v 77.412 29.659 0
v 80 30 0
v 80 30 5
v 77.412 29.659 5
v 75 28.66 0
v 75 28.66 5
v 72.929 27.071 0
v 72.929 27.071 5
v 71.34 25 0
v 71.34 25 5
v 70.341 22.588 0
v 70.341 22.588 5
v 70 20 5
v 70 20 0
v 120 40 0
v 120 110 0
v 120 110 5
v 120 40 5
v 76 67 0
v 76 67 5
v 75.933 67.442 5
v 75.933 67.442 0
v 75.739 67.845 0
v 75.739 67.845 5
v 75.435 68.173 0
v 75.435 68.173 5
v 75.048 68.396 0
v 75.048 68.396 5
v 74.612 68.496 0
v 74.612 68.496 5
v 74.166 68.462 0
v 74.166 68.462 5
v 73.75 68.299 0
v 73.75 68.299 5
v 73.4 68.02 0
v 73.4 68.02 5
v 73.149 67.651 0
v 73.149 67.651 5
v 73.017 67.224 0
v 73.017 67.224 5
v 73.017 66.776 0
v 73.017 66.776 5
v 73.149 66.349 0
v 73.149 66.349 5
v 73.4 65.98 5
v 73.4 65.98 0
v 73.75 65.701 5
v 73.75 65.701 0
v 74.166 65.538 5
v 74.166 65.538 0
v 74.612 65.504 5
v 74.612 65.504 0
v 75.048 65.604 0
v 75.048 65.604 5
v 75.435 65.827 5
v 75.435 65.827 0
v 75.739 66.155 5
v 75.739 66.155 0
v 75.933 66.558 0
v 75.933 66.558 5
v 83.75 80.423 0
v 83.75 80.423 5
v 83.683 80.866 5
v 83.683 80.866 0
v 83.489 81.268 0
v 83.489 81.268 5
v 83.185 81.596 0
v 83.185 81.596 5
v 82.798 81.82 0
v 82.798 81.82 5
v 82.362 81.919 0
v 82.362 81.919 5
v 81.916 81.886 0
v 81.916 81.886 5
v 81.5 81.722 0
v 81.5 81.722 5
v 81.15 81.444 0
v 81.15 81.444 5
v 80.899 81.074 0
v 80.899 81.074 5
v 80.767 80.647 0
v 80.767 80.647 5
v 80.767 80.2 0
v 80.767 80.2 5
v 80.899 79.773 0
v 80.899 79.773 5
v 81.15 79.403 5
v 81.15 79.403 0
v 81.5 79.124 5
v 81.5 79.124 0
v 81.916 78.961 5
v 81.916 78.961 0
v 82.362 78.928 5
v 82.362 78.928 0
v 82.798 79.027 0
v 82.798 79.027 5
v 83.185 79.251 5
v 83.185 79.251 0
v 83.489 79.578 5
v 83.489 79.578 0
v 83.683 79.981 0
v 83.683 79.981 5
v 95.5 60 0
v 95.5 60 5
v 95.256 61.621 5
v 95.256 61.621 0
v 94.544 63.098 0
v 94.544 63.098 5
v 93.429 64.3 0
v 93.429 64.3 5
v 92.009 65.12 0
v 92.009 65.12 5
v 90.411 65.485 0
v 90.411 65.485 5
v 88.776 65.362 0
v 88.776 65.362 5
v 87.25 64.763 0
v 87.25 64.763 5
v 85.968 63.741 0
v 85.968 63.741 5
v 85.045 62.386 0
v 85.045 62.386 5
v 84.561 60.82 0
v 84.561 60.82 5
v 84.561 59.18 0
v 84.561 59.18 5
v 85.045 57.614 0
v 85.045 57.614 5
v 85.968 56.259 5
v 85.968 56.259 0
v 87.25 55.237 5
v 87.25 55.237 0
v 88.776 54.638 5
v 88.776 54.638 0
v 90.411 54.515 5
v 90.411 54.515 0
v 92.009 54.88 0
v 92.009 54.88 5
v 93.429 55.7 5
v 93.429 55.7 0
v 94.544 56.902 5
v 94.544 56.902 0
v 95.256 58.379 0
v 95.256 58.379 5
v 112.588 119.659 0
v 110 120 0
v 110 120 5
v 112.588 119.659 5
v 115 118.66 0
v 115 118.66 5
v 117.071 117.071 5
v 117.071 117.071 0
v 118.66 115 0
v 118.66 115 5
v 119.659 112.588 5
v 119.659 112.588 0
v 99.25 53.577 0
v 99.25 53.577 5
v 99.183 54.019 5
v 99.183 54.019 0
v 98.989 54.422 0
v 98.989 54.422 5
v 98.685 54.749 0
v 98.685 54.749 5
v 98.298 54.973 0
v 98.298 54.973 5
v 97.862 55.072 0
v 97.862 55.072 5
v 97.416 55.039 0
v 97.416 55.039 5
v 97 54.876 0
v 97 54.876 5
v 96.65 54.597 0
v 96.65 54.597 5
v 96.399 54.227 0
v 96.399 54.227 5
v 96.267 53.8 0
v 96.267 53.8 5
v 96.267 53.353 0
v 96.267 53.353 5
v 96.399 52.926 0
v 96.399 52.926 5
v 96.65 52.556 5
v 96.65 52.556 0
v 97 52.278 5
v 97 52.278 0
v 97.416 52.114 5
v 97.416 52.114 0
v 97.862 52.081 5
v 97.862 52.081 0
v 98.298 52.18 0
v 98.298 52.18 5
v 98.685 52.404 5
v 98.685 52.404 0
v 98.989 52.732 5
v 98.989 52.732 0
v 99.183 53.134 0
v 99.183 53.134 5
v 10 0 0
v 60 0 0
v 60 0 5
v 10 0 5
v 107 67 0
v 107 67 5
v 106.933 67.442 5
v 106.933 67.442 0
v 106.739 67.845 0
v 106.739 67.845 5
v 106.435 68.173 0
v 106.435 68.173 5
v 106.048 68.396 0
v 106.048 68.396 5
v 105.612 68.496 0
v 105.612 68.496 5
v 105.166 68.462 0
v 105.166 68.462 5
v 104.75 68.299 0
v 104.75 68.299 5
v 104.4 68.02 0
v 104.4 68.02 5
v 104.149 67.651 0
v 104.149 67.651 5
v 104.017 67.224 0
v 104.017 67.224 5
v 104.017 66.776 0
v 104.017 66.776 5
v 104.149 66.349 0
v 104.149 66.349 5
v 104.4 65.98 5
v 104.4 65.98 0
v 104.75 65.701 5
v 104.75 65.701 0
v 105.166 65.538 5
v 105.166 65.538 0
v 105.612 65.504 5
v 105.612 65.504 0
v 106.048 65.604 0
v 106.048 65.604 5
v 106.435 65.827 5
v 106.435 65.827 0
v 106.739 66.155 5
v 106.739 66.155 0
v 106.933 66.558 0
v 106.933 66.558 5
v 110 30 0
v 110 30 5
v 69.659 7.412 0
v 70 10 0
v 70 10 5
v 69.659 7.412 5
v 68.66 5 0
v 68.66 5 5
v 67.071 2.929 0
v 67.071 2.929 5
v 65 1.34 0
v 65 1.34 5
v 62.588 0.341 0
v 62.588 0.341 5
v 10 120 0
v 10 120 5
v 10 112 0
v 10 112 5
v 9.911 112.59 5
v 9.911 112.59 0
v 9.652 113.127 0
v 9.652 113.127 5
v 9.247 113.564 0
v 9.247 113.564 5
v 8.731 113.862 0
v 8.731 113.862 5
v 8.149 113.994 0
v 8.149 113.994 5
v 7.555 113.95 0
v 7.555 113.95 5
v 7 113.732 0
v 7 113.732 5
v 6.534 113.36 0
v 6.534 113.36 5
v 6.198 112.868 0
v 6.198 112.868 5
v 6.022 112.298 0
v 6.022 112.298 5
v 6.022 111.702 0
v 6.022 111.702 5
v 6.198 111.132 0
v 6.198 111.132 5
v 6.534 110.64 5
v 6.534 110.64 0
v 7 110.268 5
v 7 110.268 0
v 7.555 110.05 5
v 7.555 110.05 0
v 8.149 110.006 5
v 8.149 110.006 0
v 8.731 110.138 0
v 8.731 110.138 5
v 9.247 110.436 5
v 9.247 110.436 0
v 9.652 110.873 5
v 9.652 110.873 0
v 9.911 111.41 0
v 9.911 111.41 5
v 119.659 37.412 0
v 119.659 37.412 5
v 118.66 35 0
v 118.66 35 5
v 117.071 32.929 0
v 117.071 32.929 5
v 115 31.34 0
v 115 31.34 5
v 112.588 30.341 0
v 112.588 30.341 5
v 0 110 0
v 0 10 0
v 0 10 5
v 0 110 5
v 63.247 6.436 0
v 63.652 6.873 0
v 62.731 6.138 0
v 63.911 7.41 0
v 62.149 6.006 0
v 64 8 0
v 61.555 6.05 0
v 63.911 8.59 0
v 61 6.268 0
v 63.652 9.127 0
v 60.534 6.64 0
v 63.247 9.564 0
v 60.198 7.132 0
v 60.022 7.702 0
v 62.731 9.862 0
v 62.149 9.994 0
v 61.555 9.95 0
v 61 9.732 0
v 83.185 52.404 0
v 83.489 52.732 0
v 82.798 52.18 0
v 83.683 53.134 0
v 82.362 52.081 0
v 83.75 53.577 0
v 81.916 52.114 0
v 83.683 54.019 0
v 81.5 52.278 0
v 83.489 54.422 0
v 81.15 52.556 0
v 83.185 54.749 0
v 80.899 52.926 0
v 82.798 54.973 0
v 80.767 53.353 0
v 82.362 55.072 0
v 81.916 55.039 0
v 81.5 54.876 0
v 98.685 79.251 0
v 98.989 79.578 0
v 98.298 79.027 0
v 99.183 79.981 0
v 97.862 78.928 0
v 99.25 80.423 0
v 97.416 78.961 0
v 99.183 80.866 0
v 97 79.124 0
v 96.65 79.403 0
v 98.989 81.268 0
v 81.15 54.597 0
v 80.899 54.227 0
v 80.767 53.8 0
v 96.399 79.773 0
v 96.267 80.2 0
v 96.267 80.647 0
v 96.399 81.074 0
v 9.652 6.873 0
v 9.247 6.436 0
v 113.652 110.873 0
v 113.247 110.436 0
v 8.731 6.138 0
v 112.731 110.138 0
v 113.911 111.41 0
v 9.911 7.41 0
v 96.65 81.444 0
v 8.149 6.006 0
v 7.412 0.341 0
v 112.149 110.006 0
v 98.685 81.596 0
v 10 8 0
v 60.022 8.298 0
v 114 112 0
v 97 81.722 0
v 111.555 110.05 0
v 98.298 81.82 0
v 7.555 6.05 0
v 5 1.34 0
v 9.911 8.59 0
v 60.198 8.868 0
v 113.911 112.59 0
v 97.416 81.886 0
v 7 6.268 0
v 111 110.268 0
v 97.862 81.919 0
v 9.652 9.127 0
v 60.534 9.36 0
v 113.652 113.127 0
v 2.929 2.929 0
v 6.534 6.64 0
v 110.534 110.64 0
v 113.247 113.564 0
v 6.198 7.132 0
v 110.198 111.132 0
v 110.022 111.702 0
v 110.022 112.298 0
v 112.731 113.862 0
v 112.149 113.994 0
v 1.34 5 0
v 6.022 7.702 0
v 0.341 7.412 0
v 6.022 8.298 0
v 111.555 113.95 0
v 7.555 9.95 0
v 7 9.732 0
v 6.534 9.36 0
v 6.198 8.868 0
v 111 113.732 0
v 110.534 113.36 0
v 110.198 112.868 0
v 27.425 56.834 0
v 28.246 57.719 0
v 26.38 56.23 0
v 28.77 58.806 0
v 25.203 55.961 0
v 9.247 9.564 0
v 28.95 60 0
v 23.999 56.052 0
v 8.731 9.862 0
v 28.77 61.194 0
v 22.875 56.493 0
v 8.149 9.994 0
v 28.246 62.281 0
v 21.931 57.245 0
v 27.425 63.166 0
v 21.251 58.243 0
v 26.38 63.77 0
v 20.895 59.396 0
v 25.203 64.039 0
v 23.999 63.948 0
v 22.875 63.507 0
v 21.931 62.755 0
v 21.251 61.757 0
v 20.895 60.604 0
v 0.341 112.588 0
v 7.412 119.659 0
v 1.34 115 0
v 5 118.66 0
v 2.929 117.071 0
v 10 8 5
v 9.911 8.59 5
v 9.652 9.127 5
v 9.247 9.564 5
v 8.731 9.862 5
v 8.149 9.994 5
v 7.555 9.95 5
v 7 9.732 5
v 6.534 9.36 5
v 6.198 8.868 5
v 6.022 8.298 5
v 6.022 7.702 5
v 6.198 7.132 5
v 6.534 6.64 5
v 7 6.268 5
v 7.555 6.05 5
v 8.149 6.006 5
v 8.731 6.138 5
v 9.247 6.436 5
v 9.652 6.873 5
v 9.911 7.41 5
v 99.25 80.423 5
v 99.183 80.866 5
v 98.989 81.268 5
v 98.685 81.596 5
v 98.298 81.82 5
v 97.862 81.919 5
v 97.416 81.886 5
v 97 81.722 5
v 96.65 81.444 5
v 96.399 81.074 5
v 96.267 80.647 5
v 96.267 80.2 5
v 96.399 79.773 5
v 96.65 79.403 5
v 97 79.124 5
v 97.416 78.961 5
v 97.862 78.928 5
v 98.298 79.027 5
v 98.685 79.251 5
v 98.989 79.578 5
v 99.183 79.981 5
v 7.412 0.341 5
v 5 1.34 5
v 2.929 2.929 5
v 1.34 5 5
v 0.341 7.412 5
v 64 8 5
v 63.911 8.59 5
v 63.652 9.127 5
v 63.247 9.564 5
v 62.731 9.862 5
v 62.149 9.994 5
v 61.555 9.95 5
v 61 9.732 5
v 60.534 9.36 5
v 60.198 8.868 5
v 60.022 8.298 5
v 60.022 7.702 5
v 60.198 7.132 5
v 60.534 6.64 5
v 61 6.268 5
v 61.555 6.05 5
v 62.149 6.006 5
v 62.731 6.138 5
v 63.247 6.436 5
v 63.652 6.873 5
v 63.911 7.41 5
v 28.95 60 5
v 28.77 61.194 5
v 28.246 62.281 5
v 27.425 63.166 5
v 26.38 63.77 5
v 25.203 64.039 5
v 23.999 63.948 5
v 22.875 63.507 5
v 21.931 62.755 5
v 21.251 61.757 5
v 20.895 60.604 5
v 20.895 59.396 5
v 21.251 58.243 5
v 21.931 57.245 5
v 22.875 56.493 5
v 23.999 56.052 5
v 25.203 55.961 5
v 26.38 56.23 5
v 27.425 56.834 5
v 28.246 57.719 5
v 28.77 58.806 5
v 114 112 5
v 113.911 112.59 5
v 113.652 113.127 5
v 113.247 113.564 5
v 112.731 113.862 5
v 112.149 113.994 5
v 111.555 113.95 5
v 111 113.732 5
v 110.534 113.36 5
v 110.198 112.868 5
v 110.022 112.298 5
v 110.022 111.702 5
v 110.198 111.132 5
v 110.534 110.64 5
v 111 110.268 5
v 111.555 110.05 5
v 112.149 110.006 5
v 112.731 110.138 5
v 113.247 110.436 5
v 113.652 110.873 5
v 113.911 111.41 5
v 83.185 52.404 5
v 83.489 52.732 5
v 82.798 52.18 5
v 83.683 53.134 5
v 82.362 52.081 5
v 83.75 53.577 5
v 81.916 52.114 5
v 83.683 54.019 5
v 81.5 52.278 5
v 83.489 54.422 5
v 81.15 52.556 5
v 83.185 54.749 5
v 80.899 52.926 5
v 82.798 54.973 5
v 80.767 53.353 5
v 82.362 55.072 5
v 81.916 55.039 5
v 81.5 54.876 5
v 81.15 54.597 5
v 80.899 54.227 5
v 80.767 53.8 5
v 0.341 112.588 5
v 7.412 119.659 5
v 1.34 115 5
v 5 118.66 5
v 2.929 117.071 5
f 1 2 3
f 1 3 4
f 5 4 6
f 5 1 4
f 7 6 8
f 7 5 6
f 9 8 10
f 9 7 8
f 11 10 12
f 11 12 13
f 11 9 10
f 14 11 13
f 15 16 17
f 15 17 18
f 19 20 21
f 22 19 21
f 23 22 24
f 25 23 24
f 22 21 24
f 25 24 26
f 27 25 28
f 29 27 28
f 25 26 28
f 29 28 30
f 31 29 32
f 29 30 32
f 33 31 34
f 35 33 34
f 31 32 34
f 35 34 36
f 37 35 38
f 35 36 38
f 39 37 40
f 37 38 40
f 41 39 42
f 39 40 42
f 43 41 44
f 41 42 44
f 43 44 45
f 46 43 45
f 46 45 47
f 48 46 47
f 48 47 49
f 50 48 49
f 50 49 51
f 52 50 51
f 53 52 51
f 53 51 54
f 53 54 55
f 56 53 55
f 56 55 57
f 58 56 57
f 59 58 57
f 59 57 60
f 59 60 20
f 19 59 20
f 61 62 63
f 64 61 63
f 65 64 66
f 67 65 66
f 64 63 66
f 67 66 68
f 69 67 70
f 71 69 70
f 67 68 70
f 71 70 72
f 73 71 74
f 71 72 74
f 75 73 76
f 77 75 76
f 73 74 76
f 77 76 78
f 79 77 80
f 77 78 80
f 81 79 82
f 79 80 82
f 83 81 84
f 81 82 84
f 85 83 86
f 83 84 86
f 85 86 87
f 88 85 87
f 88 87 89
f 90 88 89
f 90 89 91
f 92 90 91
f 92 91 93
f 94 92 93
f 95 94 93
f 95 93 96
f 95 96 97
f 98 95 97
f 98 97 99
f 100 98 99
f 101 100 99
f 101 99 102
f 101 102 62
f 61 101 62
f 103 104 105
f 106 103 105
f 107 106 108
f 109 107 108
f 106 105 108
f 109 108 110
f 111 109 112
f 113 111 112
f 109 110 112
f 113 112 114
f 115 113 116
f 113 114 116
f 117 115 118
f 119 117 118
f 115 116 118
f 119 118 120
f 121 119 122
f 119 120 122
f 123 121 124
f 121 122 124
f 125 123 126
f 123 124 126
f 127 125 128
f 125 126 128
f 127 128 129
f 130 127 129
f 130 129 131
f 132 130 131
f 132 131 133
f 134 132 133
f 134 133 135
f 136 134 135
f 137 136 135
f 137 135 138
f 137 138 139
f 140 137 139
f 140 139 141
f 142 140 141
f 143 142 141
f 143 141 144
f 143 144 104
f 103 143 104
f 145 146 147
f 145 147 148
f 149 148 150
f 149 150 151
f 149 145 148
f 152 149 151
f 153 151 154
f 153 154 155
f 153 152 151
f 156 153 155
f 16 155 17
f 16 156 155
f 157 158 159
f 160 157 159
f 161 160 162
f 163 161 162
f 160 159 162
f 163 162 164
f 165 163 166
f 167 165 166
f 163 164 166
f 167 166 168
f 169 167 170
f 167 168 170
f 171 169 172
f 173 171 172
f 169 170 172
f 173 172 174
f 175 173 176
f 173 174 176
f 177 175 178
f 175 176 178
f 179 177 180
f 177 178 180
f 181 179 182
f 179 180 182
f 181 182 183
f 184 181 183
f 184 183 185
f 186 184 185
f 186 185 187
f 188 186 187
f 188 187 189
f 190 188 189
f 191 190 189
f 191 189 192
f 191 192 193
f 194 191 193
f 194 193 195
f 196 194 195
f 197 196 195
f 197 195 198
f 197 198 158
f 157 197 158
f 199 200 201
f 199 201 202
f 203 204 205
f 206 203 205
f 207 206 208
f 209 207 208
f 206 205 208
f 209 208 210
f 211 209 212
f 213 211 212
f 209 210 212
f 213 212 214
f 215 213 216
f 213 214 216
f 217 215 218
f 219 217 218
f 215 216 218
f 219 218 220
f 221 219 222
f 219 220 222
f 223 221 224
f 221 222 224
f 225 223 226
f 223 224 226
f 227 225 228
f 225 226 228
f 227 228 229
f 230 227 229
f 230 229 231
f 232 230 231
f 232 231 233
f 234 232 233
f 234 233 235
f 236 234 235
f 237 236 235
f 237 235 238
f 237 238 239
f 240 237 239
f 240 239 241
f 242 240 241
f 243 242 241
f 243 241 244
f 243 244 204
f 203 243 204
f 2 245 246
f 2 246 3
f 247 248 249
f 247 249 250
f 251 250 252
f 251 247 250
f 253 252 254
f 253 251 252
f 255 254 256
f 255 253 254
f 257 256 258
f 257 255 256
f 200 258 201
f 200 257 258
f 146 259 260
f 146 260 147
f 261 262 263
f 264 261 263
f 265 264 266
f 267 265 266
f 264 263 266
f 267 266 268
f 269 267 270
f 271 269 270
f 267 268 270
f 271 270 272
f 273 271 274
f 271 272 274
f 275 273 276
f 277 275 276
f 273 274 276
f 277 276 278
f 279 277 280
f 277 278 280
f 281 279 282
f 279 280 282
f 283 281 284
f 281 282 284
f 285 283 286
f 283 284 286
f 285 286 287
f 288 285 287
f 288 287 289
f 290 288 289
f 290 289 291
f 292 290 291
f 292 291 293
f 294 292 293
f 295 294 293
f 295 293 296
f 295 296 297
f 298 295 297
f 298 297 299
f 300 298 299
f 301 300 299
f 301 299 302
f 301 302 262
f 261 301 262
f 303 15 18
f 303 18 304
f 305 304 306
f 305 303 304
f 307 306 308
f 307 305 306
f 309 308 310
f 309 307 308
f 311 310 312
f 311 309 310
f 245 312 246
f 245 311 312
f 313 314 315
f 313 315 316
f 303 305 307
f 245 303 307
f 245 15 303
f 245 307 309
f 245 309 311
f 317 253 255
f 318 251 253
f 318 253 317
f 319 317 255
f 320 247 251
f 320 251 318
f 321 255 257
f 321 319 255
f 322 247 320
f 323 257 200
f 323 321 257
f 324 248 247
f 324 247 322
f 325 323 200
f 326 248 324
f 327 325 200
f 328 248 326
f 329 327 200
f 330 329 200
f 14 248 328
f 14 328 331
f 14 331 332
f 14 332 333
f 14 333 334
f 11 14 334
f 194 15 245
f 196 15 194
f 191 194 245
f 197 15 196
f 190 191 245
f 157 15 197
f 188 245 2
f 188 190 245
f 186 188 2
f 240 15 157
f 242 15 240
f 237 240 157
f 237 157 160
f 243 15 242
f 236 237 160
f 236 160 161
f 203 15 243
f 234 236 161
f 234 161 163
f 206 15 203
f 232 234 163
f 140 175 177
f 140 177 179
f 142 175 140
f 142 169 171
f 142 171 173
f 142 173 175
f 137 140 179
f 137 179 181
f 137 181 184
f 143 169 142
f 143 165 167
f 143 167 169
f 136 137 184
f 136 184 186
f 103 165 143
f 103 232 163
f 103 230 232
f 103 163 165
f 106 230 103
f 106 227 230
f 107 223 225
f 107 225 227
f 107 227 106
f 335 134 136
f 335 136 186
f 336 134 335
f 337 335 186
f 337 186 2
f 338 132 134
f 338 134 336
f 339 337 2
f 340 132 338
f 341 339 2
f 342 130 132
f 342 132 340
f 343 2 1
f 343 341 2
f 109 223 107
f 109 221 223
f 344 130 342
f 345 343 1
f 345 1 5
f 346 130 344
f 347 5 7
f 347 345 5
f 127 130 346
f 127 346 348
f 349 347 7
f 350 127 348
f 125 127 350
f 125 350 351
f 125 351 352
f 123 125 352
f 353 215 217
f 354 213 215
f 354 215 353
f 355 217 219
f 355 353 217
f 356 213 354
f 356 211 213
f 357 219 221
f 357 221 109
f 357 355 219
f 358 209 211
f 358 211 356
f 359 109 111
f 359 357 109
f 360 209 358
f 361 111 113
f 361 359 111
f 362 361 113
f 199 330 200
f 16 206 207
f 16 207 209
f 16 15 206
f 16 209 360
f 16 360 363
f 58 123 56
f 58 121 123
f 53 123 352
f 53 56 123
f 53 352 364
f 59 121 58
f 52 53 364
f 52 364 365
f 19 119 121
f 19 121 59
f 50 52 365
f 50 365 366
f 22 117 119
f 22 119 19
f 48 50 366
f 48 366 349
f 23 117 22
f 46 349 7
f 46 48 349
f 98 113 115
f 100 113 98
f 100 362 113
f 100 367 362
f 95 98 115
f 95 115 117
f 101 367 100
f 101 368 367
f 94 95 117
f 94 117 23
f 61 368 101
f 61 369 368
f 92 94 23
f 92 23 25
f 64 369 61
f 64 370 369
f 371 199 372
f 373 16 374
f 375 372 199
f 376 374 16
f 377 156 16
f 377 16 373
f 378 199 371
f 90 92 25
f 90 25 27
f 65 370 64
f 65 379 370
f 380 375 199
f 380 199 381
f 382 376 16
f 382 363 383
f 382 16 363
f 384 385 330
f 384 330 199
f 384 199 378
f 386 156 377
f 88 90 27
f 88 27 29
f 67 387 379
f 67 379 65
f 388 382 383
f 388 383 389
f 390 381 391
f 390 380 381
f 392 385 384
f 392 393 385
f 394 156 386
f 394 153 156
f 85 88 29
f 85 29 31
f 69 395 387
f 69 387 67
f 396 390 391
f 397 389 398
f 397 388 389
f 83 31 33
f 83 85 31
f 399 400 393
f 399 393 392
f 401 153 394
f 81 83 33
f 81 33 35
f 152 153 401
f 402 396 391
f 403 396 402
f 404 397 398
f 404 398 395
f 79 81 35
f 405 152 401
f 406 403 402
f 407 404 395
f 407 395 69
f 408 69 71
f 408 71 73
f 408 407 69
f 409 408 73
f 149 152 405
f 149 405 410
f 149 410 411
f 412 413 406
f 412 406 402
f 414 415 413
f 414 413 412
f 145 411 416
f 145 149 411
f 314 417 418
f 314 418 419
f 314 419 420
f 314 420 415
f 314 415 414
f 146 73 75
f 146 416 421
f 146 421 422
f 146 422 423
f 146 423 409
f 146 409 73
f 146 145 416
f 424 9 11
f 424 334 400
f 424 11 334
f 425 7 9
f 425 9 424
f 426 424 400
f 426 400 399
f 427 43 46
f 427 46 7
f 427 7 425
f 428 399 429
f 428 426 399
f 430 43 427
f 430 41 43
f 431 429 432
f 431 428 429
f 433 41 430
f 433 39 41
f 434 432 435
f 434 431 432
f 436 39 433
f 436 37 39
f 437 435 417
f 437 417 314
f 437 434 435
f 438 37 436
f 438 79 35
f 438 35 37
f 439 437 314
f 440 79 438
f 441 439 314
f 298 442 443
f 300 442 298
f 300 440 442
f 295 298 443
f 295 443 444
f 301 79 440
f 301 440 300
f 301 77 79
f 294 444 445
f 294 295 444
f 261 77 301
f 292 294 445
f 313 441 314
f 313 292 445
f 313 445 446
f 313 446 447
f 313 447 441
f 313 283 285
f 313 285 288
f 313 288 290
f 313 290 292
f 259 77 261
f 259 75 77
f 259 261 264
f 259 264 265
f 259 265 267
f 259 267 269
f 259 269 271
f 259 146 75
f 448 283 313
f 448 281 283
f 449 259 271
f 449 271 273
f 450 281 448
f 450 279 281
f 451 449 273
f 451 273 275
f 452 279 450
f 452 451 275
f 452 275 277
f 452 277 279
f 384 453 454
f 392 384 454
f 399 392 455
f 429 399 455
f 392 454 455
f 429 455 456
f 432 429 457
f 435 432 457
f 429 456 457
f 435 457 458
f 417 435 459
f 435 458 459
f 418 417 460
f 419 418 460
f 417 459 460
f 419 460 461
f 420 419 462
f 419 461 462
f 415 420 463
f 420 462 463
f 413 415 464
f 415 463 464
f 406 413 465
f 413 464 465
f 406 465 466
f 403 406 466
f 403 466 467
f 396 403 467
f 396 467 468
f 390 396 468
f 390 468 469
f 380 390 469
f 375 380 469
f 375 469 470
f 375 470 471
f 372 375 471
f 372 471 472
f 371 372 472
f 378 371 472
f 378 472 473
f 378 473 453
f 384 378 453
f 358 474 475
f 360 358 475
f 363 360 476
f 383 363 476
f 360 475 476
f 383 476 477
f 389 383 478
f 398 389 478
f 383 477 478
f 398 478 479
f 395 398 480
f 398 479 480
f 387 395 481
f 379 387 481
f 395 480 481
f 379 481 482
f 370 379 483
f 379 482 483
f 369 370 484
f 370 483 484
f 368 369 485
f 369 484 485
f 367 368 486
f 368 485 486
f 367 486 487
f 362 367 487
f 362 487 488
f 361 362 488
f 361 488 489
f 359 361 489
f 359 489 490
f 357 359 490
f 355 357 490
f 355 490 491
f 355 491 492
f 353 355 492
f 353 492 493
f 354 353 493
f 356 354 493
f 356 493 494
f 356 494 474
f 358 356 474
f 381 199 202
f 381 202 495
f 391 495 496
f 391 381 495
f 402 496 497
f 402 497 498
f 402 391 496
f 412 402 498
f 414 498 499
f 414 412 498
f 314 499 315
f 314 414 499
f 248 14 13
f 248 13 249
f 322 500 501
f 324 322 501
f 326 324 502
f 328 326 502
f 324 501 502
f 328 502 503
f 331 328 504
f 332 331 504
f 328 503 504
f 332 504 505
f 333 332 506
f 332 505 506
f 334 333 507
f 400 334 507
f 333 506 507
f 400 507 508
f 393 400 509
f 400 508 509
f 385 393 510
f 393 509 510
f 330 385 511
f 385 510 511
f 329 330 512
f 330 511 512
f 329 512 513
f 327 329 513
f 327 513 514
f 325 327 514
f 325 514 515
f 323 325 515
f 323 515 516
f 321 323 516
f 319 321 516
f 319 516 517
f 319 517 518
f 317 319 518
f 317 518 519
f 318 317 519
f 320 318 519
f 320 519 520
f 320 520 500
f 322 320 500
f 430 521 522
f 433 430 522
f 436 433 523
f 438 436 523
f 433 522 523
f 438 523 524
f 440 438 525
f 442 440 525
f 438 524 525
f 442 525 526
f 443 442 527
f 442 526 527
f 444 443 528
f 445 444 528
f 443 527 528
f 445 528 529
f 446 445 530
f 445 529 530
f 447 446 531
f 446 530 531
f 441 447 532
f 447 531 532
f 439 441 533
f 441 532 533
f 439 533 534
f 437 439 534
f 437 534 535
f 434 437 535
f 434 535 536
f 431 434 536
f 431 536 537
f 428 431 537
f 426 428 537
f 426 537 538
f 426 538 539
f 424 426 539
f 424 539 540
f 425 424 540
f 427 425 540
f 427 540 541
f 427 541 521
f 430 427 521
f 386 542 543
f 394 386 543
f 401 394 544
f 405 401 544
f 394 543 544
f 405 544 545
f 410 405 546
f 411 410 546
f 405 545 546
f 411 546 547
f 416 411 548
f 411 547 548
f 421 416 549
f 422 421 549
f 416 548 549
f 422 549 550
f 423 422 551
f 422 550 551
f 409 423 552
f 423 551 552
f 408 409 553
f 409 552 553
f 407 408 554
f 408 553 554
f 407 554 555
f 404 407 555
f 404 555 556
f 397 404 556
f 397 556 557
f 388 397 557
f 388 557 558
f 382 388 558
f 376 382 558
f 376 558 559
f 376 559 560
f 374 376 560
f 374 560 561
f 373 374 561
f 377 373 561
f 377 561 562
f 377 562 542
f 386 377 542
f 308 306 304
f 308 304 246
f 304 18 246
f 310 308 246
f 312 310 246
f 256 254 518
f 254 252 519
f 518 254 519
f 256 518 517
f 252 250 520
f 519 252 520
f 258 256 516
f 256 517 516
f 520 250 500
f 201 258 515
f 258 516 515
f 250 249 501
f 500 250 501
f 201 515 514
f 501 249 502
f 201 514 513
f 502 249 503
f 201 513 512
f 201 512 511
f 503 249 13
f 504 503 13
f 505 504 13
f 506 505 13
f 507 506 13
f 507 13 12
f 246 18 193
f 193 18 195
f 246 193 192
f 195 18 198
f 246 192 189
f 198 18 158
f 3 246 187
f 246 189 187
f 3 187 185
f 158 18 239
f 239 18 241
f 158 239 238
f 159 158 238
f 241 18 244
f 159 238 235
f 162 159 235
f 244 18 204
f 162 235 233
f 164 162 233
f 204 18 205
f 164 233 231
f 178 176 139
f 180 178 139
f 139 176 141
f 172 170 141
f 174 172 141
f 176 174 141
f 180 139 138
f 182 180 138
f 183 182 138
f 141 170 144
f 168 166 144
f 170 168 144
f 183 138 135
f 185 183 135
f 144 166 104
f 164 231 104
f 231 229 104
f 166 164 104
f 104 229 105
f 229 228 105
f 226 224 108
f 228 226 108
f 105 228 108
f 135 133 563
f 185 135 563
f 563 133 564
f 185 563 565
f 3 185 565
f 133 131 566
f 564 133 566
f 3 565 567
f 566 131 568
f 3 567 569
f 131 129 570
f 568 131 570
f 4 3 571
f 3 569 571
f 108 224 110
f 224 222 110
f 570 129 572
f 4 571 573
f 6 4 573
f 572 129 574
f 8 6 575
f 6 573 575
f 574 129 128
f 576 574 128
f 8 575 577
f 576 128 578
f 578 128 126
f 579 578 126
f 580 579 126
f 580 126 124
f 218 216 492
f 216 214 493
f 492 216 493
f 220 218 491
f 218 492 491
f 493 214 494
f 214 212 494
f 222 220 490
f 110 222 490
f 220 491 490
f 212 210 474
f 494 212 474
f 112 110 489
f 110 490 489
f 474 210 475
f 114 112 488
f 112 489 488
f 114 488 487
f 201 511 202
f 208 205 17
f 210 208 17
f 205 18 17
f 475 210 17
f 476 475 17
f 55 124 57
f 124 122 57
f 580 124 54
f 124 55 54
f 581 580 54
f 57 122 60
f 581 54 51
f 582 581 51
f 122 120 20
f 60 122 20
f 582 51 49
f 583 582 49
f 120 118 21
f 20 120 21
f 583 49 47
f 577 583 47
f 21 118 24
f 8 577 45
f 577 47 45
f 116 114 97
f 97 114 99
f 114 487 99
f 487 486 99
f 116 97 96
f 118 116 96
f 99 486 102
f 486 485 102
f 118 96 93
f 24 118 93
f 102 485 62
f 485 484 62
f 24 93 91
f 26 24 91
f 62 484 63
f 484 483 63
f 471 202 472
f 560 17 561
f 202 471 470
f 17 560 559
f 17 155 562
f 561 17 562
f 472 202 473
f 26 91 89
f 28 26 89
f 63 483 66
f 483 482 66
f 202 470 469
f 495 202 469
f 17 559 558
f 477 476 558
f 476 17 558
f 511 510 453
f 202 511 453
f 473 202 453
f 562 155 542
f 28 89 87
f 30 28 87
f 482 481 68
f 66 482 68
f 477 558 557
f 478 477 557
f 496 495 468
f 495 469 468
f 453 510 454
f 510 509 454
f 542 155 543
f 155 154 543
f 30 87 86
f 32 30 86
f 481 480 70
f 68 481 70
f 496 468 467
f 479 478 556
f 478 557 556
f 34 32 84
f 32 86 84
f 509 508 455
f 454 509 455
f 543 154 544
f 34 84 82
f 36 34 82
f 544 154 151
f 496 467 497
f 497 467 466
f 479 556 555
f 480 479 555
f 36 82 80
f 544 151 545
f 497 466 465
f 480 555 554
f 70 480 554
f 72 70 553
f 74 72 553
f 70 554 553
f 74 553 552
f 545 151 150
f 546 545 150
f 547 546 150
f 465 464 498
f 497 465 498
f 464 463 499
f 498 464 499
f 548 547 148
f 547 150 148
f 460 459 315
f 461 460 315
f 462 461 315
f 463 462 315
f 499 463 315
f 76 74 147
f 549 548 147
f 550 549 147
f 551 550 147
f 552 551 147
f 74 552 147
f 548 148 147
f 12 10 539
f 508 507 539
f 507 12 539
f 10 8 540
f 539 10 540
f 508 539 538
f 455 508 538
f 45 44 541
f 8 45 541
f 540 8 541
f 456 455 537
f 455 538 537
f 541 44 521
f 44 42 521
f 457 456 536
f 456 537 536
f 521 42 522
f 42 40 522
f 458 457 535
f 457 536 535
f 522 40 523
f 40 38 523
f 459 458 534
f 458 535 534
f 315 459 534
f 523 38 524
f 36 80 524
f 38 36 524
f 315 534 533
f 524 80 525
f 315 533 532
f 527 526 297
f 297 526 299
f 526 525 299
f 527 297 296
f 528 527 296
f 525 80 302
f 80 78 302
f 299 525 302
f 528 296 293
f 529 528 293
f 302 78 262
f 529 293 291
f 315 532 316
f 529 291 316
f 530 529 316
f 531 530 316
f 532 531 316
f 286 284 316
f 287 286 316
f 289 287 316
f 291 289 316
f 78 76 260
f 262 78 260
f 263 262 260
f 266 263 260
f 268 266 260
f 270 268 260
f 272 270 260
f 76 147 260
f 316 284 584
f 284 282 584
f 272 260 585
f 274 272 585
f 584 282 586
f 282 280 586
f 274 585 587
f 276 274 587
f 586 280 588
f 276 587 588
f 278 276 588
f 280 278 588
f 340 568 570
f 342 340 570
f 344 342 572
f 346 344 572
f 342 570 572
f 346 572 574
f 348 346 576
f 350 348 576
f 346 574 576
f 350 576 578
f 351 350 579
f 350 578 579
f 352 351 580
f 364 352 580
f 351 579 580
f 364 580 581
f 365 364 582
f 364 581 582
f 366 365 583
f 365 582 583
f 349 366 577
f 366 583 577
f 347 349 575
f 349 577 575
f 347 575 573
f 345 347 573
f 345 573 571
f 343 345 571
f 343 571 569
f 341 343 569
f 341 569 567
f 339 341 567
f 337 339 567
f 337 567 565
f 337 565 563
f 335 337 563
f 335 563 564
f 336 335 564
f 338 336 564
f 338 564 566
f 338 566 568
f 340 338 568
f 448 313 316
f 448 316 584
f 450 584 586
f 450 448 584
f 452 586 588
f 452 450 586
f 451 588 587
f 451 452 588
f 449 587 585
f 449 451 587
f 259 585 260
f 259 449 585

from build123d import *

# Parameters (mm, degrees)
SALIENTE_EXTRUIR1_DEPTH = 5
CROQUIS2_R              = 2
CROQUIS2_R_2            = 4.05
CROQUIS2_R_3            = 1.5
CROQUIS2_R_4            = 5.5
CORTAR_EXTRUIR1_DEPTH   = 10


with BuildPart() as part:
    # Croquis1 → Saliente-Extruir1 (new body)
    with BuildSketch(Plane.XY):
        with BuildLine():
            Line((110, 30), (80, 30))
            ThreePointArc((80, 30), (72.928932188, 27.071067812), (70, 20))
            Line((70, 20), (70, 10))
            ThreePointArc((70, 10), (67.071067812, 2.928932188), (60, 0))
            Line((60, 0), (10, 0))
            ThreePointArc((10, 0), (2.928932188, 2.928932188), (0, 10))
            Line((0, 10), (0, 110))
            ThreePointArc((0, 110), (2.928932188, 117.071067812), (10, 120))
            Line((10, 120), (110, 120))
            ThreePointArc((110, 120), (117.071067812, 117.071067812), (120, 110))
            Line((120, 110), (120, 40))
            ThreePointArc((120, 40), (117.071067812, 32.928932188), (110, 30))
        make_face()
    extrude(amount=SALIENTE_EXTRUIR1_DEPTH)

    # Croquis2 → Cortar-Extruir1 (cut)
    with BuildSketch(Plane.XY.offset(5)):
        with Locations((8, 112)):
            Circle(CROQUIS2_R)
        with Locations((8, 8)):
            Circle(CROQUIS2_R)
        with Locations((112, 8)):
            Circle(CROQUIS2_R)
        with Locations((112, 112)):
            Circle(CROQUIS2_R)
        with Locations((62, 8)):
            Circle(CROQUIS2_R)
        with Locations((24.9, 60)):
            Circle(CROQUIS2_R_2)
        with Locations((82.25, 80.423393759)):
            Circle(CROQUIS2_R_3)
        with Locations((97.75, 80.423393759)):
            Circle(CROQUIS2_R_3)
        with Locations((105.5, 67)):
            Circle(CROQUIS2_R_3)
        with Locations((97.75, 53.576606241)):
            Circle(CROQUIS2_R_3)
        with Locations((82.25, 53.576606241)):
            Circle(CROQUIS2_R_3)
        with Locations((74.5, 67)):
            Circle(CROQUIS2_R_3)
        with Locations((90, 60)):
            Circle(CROQUIS2_R_4)
    extrude(amount=-CORTAR_EXTRUIR1_DEPTH, mode=Mode.SUBTRACT)


solid = part.part
